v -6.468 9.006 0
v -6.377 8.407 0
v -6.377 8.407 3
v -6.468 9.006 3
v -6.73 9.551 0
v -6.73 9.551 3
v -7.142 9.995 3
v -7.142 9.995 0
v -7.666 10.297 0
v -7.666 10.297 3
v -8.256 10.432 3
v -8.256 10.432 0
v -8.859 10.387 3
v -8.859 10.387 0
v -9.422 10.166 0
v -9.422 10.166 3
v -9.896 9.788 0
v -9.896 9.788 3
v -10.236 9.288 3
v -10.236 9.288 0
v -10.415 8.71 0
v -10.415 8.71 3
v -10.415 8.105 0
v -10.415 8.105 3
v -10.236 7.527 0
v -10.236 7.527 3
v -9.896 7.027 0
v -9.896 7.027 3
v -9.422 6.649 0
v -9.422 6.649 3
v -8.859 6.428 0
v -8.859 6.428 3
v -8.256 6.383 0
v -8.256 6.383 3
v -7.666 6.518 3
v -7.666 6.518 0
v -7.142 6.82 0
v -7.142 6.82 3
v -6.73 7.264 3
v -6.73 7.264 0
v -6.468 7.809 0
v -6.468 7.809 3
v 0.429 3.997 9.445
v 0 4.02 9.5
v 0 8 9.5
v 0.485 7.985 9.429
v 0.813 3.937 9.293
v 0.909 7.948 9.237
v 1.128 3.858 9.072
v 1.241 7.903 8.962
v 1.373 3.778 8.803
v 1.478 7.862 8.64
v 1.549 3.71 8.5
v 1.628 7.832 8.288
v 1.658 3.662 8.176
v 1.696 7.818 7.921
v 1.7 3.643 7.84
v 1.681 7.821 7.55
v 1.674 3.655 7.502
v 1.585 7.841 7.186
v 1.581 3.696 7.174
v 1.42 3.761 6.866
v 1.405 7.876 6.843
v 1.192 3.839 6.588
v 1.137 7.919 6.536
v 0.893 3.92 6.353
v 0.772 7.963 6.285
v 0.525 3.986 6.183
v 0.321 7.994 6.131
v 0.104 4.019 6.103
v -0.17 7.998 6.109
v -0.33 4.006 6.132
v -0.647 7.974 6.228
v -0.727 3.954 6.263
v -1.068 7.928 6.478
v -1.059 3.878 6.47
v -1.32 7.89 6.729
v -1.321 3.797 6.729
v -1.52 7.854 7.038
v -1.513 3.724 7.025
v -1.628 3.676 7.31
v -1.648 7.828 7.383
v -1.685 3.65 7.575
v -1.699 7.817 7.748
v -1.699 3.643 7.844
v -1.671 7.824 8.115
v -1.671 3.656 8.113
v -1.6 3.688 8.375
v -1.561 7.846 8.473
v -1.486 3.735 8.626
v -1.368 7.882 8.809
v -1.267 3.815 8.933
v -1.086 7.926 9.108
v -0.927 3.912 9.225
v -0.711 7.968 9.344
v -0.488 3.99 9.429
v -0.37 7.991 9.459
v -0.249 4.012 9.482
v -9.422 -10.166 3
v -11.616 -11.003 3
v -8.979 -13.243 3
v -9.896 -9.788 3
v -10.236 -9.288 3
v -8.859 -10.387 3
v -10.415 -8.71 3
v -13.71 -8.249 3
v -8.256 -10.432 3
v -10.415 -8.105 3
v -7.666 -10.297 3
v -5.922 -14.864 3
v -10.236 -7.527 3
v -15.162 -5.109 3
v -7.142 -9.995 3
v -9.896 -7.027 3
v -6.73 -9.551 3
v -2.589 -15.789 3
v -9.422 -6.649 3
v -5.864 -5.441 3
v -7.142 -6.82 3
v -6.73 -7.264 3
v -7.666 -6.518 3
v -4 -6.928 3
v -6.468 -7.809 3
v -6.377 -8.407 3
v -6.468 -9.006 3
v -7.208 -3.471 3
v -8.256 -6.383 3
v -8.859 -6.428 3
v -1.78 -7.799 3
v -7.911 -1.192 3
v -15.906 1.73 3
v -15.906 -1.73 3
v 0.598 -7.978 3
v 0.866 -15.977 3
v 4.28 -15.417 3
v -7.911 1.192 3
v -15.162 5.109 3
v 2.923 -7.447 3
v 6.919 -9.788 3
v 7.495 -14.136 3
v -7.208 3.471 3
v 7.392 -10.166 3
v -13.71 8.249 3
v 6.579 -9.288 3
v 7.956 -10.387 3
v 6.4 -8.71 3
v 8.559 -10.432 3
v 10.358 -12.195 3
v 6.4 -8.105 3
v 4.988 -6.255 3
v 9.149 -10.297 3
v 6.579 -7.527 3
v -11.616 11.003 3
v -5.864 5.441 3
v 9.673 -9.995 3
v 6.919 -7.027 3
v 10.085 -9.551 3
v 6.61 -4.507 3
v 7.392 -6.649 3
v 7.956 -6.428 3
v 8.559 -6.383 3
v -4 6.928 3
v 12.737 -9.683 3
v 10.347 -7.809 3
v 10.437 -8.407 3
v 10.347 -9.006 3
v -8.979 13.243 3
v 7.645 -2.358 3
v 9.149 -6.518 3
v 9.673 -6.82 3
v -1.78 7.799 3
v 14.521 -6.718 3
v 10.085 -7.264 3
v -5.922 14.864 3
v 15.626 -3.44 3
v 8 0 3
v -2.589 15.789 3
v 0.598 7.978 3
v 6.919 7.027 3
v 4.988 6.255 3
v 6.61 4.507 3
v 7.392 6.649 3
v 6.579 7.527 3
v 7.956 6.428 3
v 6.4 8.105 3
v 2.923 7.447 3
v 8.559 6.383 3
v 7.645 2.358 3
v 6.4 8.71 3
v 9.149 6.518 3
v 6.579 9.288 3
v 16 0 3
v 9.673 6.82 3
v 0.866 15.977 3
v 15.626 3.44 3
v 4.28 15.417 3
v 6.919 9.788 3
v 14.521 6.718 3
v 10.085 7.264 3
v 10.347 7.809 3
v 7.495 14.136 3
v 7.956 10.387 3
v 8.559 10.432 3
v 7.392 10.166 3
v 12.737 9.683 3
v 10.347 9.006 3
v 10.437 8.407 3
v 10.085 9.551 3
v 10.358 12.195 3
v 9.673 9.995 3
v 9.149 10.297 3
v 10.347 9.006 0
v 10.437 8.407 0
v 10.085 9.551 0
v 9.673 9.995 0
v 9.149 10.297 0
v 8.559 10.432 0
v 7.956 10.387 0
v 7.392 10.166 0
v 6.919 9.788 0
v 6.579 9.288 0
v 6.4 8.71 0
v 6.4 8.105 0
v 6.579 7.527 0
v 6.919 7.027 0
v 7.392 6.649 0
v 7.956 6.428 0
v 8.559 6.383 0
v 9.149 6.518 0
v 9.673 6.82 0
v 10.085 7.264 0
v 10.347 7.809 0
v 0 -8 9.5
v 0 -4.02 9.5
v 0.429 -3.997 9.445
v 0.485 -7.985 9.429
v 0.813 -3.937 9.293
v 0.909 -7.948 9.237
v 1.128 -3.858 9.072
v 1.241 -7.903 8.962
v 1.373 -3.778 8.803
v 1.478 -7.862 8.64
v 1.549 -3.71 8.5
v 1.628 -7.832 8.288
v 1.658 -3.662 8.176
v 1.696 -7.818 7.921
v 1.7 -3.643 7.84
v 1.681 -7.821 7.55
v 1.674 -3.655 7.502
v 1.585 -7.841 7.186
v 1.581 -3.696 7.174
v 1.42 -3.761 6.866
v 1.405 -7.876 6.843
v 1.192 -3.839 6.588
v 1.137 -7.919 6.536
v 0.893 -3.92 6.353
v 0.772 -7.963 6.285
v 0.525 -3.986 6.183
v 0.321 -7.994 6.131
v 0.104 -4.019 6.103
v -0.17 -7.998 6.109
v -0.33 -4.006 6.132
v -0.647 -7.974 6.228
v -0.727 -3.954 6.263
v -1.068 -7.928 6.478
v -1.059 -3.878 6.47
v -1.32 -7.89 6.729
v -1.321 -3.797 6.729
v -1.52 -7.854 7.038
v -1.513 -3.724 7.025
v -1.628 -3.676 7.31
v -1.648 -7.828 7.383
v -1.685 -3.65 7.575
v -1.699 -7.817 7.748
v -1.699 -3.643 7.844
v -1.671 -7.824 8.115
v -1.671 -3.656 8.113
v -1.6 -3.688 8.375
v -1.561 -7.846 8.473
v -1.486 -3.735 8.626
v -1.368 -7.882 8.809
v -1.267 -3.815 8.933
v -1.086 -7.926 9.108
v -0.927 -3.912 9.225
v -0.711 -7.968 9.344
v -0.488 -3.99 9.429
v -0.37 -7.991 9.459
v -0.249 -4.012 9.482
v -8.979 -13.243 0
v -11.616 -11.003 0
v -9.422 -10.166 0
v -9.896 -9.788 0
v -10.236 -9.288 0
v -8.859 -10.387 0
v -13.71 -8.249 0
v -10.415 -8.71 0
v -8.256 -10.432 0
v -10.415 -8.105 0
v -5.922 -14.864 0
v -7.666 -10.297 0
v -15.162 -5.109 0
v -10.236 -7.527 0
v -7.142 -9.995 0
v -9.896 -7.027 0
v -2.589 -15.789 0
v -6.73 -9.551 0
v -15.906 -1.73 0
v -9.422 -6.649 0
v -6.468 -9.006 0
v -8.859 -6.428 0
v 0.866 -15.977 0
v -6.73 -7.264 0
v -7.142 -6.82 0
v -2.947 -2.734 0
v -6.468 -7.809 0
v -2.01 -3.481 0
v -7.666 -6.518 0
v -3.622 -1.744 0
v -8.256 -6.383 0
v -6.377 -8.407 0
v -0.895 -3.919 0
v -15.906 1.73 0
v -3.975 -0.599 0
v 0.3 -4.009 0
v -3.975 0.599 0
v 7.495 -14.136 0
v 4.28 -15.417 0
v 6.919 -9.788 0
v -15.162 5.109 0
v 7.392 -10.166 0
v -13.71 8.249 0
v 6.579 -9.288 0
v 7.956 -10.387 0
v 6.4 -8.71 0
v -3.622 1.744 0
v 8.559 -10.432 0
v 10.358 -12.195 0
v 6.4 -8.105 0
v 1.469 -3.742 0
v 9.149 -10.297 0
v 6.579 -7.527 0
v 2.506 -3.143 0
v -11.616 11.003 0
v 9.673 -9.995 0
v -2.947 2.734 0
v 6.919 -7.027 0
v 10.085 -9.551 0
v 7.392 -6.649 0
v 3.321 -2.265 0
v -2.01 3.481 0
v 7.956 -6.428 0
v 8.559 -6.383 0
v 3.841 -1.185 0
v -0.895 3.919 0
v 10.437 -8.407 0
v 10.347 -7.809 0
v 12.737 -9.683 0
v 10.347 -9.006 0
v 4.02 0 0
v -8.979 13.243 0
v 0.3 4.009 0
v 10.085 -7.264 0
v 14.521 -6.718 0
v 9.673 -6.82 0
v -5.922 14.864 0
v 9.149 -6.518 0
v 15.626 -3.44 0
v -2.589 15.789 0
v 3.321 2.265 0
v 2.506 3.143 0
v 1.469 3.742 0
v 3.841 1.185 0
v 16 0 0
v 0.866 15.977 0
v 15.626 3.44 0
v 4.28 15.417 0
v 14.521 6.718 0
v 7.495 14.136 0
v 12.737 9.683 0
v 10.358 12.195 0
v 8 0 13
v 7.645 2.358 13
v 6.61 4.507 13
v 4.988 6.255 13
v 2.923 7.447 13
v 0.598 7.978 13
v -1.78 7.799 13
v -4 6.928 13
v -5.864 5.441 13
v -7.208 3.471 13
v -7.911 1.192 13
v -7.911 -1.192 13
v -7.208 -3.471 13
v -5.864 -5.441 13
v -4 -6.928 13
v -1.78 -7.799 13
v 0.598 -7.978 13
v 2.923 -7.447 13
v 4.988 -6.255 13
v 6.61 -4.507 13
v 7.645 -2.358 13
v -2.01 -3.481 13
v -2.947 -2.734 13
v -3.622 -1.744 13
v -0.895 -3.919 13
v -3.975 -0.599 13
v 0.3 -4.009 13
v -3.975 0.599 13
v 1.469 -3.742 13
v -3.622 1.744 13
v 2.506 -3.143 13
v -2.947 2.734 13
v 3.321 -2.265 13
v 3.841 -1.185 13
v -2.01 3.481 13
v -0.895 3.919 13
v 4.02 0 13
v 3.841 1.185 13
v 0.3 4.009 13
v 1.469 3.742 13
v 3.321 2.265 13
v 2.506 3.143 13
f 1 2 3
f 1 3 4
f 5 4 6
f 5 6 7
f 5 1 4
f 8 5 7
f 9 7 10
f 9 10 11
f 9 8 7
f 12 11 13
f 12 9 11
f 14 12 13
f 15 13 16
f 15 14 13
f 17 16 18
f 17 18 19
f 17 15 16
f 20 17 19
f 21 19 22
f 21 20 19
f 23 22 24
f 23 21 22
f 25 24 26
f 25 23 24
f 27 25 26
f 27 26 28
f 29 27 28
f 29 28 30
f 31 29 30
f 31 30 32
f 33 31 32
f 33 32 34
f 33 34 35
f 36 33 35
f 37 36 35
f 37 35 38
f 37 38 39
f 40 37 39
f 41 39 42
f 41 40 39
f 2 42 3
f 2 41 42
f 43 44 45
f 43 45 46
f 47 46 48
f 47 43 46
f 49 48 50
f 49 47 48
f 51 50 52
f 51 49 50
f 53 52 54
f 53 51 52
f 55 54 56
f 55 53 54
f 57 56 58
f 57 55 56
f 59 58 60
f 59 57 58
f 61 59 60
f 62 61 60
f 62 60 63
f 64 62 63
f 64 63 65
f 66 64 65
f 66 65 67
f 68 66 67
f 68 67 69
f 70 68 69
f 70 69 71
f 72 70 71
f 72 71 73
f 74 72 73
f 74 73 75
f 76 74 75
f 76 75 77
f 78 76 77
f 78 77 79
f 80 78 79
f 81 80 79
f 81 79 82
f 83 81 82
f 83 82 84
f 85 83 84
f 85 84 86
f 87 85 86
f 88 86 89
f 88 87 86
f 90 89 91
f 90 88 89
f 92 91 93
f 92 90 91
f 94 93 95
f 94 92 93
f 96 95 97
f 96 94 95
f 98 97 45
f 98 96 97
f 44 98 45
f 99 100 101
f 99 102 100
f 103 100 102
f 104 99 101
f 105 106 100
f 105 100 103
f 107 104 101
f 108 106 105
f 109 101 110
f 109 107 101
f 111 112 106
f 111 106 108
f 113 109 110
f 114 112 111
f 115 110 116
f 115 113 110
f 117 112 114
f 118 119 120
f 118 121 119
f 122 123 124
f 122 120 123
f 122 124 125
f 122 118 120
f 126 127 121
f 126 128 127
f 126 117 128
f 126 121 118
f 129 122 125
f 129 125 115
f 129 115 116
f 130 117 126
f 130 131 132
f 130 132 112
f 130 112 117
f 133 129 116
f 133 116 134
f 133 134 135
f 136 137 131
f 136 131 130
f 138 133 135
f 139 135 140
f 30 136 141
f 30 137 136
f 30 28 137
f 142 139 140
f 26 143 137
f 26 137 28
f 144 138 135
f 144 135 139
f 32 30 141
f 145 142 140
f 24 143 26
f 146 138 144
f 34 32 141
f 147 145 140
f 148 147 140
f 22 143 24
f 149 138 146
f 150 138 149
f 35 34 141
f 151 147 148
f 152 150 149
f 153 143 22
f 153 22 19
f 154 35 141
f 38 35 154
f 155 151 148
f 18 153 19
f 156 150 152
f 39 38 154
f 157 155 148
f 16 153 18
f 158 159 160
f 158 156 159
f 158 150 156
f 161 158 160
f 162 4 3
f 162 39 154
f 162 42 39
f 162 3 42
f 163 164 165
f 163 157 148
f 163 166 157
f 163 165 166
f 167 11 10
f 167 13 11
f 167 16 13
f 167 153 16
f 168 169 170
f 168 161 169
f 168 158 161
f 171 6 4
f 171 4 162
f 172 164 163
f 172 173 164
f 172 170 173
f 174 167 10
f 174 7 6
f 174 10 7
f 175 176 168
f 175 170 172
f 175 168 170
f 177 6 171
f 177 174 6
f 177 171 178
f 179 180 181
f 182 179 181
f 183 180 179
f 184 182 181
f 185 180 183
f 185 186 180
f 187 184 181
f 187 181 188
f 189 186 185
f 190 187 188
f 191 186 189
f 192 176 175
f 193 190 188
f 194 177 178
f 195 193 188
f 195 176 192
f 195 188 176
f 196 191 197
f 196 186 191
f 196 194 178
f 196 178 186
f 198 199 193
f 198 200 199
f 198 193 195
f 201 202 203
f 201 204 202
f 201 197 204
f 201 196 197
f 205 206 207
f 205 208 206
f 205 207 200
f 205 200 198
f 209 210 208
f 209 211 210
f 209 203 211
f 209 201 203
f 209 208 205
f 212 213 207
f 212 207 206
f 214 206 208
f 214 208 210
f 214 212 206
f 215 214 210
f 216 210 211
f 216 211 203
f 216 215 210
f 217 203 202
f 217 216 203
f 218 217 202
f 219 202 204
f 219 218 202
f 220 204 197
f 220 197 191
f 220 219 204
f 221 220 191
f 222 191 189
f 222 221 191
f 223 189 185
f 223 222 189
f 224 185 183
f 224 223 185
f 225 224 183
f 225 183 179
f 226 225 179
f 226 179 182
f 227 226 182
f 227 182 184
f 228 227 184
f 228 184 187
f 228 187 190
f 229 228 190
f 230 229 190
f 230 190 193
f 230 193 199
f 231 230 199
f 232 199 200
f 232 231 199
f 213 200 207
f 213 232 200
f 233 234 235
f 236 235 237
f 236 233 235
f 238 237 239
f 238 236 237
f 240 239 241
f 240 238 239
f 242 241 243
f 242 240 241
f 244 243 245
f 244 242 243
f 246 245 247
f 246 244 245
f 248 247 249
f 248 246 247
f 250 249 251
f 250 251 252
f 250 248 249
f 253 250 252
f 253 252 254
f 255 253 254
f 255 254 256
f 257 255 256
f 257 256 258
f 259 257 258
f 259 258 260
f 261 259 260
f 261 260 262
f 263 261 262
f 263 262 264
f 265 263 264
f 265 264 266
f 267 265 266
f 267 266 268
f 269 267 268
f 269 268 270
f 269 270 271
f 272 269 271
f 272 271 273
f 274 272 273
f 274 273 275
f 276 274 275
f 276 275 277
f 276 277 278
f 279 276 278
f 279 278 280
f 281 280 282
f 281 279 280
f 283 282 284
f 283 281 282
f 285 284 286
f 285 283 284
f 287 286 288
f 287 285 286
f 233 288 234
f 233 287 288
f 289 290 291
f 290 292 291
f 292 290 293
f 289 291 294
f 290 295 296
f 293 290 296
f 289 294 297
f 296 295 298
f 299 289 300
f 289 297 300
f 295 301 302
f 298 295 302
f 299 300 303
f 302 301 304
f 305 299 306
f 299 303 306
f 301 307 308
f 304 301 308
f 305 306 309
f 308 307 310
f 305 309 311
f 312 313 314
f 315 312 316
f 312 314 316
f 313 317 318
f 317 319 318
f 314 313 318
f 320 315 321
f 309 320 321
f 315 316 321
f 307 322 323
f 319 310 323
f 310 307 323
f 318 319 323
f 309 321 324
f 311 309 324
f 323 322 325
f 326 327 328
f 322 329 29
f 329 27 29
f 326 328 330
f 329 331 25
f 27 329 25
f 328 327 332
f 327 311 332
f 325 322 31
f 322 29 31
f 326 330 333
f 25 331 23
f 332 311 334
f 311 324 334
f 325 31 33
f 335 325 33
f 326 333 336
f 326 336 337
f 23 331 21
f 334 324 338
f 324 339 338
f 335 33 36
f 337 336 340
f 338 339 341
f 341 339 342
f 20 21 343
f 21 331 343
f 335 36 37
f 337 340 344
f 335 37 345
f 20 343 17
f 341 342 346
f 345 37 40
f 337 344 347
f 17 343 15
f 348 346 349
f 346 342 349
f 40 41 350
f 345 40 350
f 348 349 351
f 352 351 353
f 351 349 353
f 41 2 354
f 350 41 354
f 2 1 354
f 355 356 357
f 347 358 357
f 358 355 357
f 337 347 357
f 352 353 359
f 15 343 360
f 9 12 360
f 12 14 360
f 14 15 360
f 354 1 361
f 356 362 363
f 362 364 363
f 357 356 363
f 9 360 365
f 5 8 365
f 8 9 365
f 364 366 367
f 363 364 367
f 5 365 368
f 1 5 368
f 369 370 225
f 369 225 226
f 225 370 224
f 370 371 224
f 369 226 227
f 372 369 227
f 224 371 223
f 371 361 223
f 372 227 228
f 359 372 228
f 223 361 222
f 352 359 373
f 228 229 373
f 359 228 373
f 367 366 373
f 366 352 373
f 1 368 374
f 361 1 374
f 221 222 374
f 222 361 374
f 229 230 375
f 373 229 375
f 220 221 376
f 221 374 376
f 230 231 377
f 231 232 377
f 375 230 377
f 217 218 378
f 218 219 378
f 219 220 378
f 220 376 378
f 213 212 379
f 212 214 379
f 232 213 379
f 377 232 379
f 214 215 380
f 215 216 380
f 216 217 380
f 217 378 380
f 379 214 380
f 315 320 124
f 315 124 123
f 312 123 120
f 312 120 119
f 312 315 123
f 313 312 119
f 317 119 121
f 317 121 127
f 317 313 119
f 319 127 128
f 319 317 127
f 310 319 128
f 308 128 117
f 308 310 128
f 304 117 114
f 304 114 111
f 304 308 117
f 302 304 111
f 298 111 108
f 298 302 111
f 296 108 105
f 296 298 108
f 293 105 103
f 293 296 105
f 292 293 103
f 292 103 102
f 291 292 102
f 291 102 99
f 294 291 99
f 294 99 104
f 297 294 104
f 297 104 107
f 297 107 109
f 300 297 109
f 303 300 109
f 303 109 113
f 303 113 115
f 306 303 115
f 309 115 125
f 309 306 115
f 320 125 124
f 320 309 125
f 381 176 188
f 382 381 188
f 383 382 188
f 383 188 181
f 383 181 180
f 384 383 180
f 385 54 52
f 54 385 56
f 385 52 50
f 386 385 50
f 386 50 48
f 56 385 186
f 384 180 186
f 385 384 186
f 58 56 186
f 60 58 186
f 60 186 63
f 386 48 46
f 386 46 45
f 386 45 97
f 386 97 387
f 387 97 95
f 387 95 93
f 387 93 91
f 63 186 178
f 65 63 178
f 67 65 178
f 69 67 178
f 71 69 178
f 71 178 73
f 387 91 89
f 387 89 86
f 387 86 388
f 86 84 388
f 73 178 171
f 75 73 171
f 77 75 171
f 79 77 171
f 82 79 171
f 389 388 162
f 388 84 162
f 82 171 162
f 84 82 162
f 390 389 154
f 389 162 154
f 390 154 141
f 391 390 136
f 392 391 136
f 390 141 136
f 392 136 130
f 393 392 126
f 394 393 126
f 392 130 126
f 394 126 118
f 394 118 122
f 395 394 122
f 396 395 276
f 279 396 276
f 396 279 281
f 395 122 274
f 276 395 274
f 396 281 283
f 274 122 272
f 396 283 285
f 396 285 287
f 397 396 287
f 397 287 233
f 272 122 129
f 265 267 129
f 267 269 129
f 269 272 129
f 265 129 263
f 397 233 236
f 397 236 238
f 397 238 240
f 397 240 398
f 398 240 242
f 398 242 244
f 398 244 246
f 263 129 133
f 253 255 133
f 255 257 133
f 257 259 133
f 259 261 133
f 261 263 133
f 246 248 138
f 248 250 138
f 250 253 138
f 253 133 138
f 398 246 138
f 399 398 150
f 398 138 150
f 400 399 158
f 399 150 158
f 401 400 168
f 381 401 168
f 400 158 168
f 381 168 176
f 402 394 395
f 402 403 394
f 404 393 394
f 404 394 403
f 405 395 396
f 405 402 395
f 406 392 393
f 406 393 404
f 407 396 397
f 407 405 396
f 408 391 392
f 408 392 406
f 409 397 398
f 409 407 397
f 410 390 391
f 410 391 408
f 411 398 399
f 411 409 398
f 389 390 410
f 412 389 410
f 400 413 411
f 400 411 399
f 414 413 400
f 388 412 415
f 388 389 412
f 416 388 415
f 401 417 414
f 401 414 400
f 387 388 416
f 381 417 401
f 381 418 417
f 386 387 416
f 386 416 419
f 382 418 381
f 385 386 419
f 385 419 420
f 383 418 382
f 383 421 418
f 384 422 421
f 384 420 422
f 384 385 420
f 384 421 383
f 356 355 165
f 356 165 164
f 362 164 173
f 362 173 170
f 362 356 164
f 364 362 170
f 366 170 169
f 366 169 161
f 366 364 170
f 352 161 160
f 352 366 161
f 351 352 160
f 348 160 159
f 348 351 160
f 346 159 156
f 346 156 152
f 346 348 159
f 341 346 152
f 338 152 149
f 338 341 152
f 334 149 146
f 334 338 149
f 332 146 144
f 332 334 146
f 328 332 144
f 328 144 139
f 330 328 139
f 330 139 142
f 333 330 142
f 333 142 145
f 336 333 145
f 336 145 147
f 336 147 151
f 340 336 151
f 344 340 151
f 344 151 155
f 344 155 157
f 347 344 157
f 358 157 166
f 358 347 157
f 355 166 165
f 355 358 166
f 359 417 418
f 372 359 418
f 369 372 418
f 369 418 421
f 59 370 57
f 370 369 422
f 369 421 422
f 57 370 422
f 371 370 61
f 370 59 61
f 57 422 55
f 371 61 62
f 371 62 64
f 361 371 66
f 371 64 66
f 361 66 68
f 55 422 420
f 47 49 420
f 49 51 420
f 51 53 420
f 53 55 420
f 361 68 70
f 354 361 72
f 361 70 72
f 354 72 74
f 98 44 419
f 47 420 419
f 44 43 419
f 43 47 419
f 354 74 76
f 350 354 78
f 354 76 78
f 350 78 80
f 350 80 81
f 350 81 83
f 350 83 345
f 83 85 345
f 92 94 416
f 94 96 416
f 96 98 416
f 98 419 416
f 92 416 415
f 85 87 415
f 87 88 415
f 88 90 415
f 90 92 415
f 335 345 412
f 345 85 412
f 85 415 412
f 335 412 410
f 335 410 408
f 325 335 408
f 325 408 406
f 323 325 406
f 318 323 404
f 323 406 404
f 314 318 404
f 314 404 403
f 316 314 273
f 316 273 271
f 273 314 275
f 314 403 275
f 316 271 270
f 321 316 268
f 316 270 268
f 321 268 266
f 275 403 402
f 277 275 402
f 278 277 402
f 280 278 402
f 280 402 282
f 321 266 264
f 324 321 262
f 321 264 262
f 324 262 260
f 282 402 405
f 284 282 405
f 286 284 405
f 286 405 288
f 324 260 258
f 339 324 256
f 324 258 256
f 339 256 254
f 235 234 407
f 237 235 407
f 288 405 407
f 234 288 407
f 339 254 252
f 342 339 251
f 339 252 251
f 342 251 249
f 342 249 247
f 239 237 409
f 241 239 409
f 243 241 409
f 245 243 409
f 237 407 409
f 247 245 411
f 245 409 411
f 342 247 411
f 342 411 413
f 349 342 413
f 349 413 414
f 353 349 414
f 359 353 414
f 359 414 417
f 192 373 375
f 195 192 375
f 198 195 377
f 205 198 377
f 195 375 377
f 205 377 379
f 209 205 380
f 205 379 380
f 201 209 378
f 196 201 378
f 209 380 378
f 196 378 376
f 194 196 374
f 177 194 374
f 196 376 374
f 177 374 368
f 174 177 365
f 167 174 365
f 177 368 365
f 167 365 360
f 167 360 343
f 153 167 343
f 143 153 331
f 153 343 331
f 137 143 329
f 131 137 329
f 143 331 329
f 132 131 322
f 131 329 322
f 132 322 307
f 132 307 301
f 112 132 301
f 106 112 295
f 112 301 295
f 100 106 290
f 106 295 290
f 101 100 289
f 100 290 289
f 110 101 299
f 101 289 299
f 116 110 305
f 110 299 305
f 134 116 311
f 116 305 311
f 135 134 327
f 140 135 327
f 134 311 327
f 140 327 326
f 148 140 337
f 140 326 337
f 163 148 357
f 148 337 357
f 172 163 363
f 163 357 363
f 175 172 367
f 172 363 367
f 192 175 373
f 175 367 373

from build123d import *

# Parameters (mm, degrees)
ESQUISSE1_R                  = 16
ESQUISSE1_R_2                = 2.03
BOSS_EXTRU_1_DEPTH           = 3
ESQUISSE2_R                  = 8
ESQUISSE2_R_2                = 4.02
BOSS_EXTRU_2_DEPTH           = 10
ESQUISSE3_R                  = 4.02
ENL_V_MAT_EXTRU_1_DEPTH      = 27.095976701
ENL_V_MAT_EXTRU_2_DEPTH      = 27.095976701
ENL_V_MAT_EXTRU_2_DEPTH_BACK = 27.095976701
ESQUISSE4_R                  = 1.7


with BuildPart() as part:
    # Esquisse1 → Boss.-Extru.1 (new body)
    with BuildSketch(Plane.XY):
        Circle(ESQUISSE1_R)
        with Locations((-8.407499628, 8.407499628)):
            Circle(ESQUISSE1_R_2, mode=Mode.SUBTRACT)
        with Locations((8.407499628, 8.407499628)):
            Circle(ESQUISSE1_R_2, mode=Mode.SUBTRACT)
        with Locations((8.407499628, -8.407499628)):
            Circle(ESQUISSE1_R_2, mode=Mode.SUBTRACT)
        with Locations((-8.407499628, -8.407499628)):
            Circle(ESQUISSE1_R_2, mode=Mode.SUBTRACT)
    extrude(amount=BOSS_EXTRU_1_DEPTH)

    # Esquisse2 → Boss.-Extru.2 (add)
    with BuildSketch(Plane.XY.offset(3)):
        Circle(ESQUISSE2_R)
        Circle(ESQUISSE2_R_2, mode=Mode.SUBTRACT)
    extrude(amount=BOSS_EXTRU_2_DEPTH)

    # Esquisse3 → Enlèv. mat.-Extru.1 (cut, through all)
    with BuildSketch(Plane.XY.offset(13)):
        Circle(ESQUISSE3_R)
    extrude(amount=-ENL_V_MAT_EXTRU_1_DEPTH, mode=Mode.SUBTRACT)

    # Esquisse4 → Enlèv. mat.-Extru.2 (cut, two sides: drawn at the far end of the back side and taken through both)
    with BuildSketch(Plane(origin=(0, 0, 0), x_dir=(1, 0, 0), z_dir=(0, 1, 0)).offset(-ENL_V_MAT_EXTRU_2_DEPTH_BACK)):
        with Locations(Location((0, -7.8, 0), (0, 0, 270))):
            Circle(ESQUISSE4_R)
    extrude(amount=ENL_V_MAT_EXTRU_2_DEPTH + ENL_V_MAT_EXTRU_2_DEPTH_BACK, mode=Mode.SUBTRACT)


solid = part.part
